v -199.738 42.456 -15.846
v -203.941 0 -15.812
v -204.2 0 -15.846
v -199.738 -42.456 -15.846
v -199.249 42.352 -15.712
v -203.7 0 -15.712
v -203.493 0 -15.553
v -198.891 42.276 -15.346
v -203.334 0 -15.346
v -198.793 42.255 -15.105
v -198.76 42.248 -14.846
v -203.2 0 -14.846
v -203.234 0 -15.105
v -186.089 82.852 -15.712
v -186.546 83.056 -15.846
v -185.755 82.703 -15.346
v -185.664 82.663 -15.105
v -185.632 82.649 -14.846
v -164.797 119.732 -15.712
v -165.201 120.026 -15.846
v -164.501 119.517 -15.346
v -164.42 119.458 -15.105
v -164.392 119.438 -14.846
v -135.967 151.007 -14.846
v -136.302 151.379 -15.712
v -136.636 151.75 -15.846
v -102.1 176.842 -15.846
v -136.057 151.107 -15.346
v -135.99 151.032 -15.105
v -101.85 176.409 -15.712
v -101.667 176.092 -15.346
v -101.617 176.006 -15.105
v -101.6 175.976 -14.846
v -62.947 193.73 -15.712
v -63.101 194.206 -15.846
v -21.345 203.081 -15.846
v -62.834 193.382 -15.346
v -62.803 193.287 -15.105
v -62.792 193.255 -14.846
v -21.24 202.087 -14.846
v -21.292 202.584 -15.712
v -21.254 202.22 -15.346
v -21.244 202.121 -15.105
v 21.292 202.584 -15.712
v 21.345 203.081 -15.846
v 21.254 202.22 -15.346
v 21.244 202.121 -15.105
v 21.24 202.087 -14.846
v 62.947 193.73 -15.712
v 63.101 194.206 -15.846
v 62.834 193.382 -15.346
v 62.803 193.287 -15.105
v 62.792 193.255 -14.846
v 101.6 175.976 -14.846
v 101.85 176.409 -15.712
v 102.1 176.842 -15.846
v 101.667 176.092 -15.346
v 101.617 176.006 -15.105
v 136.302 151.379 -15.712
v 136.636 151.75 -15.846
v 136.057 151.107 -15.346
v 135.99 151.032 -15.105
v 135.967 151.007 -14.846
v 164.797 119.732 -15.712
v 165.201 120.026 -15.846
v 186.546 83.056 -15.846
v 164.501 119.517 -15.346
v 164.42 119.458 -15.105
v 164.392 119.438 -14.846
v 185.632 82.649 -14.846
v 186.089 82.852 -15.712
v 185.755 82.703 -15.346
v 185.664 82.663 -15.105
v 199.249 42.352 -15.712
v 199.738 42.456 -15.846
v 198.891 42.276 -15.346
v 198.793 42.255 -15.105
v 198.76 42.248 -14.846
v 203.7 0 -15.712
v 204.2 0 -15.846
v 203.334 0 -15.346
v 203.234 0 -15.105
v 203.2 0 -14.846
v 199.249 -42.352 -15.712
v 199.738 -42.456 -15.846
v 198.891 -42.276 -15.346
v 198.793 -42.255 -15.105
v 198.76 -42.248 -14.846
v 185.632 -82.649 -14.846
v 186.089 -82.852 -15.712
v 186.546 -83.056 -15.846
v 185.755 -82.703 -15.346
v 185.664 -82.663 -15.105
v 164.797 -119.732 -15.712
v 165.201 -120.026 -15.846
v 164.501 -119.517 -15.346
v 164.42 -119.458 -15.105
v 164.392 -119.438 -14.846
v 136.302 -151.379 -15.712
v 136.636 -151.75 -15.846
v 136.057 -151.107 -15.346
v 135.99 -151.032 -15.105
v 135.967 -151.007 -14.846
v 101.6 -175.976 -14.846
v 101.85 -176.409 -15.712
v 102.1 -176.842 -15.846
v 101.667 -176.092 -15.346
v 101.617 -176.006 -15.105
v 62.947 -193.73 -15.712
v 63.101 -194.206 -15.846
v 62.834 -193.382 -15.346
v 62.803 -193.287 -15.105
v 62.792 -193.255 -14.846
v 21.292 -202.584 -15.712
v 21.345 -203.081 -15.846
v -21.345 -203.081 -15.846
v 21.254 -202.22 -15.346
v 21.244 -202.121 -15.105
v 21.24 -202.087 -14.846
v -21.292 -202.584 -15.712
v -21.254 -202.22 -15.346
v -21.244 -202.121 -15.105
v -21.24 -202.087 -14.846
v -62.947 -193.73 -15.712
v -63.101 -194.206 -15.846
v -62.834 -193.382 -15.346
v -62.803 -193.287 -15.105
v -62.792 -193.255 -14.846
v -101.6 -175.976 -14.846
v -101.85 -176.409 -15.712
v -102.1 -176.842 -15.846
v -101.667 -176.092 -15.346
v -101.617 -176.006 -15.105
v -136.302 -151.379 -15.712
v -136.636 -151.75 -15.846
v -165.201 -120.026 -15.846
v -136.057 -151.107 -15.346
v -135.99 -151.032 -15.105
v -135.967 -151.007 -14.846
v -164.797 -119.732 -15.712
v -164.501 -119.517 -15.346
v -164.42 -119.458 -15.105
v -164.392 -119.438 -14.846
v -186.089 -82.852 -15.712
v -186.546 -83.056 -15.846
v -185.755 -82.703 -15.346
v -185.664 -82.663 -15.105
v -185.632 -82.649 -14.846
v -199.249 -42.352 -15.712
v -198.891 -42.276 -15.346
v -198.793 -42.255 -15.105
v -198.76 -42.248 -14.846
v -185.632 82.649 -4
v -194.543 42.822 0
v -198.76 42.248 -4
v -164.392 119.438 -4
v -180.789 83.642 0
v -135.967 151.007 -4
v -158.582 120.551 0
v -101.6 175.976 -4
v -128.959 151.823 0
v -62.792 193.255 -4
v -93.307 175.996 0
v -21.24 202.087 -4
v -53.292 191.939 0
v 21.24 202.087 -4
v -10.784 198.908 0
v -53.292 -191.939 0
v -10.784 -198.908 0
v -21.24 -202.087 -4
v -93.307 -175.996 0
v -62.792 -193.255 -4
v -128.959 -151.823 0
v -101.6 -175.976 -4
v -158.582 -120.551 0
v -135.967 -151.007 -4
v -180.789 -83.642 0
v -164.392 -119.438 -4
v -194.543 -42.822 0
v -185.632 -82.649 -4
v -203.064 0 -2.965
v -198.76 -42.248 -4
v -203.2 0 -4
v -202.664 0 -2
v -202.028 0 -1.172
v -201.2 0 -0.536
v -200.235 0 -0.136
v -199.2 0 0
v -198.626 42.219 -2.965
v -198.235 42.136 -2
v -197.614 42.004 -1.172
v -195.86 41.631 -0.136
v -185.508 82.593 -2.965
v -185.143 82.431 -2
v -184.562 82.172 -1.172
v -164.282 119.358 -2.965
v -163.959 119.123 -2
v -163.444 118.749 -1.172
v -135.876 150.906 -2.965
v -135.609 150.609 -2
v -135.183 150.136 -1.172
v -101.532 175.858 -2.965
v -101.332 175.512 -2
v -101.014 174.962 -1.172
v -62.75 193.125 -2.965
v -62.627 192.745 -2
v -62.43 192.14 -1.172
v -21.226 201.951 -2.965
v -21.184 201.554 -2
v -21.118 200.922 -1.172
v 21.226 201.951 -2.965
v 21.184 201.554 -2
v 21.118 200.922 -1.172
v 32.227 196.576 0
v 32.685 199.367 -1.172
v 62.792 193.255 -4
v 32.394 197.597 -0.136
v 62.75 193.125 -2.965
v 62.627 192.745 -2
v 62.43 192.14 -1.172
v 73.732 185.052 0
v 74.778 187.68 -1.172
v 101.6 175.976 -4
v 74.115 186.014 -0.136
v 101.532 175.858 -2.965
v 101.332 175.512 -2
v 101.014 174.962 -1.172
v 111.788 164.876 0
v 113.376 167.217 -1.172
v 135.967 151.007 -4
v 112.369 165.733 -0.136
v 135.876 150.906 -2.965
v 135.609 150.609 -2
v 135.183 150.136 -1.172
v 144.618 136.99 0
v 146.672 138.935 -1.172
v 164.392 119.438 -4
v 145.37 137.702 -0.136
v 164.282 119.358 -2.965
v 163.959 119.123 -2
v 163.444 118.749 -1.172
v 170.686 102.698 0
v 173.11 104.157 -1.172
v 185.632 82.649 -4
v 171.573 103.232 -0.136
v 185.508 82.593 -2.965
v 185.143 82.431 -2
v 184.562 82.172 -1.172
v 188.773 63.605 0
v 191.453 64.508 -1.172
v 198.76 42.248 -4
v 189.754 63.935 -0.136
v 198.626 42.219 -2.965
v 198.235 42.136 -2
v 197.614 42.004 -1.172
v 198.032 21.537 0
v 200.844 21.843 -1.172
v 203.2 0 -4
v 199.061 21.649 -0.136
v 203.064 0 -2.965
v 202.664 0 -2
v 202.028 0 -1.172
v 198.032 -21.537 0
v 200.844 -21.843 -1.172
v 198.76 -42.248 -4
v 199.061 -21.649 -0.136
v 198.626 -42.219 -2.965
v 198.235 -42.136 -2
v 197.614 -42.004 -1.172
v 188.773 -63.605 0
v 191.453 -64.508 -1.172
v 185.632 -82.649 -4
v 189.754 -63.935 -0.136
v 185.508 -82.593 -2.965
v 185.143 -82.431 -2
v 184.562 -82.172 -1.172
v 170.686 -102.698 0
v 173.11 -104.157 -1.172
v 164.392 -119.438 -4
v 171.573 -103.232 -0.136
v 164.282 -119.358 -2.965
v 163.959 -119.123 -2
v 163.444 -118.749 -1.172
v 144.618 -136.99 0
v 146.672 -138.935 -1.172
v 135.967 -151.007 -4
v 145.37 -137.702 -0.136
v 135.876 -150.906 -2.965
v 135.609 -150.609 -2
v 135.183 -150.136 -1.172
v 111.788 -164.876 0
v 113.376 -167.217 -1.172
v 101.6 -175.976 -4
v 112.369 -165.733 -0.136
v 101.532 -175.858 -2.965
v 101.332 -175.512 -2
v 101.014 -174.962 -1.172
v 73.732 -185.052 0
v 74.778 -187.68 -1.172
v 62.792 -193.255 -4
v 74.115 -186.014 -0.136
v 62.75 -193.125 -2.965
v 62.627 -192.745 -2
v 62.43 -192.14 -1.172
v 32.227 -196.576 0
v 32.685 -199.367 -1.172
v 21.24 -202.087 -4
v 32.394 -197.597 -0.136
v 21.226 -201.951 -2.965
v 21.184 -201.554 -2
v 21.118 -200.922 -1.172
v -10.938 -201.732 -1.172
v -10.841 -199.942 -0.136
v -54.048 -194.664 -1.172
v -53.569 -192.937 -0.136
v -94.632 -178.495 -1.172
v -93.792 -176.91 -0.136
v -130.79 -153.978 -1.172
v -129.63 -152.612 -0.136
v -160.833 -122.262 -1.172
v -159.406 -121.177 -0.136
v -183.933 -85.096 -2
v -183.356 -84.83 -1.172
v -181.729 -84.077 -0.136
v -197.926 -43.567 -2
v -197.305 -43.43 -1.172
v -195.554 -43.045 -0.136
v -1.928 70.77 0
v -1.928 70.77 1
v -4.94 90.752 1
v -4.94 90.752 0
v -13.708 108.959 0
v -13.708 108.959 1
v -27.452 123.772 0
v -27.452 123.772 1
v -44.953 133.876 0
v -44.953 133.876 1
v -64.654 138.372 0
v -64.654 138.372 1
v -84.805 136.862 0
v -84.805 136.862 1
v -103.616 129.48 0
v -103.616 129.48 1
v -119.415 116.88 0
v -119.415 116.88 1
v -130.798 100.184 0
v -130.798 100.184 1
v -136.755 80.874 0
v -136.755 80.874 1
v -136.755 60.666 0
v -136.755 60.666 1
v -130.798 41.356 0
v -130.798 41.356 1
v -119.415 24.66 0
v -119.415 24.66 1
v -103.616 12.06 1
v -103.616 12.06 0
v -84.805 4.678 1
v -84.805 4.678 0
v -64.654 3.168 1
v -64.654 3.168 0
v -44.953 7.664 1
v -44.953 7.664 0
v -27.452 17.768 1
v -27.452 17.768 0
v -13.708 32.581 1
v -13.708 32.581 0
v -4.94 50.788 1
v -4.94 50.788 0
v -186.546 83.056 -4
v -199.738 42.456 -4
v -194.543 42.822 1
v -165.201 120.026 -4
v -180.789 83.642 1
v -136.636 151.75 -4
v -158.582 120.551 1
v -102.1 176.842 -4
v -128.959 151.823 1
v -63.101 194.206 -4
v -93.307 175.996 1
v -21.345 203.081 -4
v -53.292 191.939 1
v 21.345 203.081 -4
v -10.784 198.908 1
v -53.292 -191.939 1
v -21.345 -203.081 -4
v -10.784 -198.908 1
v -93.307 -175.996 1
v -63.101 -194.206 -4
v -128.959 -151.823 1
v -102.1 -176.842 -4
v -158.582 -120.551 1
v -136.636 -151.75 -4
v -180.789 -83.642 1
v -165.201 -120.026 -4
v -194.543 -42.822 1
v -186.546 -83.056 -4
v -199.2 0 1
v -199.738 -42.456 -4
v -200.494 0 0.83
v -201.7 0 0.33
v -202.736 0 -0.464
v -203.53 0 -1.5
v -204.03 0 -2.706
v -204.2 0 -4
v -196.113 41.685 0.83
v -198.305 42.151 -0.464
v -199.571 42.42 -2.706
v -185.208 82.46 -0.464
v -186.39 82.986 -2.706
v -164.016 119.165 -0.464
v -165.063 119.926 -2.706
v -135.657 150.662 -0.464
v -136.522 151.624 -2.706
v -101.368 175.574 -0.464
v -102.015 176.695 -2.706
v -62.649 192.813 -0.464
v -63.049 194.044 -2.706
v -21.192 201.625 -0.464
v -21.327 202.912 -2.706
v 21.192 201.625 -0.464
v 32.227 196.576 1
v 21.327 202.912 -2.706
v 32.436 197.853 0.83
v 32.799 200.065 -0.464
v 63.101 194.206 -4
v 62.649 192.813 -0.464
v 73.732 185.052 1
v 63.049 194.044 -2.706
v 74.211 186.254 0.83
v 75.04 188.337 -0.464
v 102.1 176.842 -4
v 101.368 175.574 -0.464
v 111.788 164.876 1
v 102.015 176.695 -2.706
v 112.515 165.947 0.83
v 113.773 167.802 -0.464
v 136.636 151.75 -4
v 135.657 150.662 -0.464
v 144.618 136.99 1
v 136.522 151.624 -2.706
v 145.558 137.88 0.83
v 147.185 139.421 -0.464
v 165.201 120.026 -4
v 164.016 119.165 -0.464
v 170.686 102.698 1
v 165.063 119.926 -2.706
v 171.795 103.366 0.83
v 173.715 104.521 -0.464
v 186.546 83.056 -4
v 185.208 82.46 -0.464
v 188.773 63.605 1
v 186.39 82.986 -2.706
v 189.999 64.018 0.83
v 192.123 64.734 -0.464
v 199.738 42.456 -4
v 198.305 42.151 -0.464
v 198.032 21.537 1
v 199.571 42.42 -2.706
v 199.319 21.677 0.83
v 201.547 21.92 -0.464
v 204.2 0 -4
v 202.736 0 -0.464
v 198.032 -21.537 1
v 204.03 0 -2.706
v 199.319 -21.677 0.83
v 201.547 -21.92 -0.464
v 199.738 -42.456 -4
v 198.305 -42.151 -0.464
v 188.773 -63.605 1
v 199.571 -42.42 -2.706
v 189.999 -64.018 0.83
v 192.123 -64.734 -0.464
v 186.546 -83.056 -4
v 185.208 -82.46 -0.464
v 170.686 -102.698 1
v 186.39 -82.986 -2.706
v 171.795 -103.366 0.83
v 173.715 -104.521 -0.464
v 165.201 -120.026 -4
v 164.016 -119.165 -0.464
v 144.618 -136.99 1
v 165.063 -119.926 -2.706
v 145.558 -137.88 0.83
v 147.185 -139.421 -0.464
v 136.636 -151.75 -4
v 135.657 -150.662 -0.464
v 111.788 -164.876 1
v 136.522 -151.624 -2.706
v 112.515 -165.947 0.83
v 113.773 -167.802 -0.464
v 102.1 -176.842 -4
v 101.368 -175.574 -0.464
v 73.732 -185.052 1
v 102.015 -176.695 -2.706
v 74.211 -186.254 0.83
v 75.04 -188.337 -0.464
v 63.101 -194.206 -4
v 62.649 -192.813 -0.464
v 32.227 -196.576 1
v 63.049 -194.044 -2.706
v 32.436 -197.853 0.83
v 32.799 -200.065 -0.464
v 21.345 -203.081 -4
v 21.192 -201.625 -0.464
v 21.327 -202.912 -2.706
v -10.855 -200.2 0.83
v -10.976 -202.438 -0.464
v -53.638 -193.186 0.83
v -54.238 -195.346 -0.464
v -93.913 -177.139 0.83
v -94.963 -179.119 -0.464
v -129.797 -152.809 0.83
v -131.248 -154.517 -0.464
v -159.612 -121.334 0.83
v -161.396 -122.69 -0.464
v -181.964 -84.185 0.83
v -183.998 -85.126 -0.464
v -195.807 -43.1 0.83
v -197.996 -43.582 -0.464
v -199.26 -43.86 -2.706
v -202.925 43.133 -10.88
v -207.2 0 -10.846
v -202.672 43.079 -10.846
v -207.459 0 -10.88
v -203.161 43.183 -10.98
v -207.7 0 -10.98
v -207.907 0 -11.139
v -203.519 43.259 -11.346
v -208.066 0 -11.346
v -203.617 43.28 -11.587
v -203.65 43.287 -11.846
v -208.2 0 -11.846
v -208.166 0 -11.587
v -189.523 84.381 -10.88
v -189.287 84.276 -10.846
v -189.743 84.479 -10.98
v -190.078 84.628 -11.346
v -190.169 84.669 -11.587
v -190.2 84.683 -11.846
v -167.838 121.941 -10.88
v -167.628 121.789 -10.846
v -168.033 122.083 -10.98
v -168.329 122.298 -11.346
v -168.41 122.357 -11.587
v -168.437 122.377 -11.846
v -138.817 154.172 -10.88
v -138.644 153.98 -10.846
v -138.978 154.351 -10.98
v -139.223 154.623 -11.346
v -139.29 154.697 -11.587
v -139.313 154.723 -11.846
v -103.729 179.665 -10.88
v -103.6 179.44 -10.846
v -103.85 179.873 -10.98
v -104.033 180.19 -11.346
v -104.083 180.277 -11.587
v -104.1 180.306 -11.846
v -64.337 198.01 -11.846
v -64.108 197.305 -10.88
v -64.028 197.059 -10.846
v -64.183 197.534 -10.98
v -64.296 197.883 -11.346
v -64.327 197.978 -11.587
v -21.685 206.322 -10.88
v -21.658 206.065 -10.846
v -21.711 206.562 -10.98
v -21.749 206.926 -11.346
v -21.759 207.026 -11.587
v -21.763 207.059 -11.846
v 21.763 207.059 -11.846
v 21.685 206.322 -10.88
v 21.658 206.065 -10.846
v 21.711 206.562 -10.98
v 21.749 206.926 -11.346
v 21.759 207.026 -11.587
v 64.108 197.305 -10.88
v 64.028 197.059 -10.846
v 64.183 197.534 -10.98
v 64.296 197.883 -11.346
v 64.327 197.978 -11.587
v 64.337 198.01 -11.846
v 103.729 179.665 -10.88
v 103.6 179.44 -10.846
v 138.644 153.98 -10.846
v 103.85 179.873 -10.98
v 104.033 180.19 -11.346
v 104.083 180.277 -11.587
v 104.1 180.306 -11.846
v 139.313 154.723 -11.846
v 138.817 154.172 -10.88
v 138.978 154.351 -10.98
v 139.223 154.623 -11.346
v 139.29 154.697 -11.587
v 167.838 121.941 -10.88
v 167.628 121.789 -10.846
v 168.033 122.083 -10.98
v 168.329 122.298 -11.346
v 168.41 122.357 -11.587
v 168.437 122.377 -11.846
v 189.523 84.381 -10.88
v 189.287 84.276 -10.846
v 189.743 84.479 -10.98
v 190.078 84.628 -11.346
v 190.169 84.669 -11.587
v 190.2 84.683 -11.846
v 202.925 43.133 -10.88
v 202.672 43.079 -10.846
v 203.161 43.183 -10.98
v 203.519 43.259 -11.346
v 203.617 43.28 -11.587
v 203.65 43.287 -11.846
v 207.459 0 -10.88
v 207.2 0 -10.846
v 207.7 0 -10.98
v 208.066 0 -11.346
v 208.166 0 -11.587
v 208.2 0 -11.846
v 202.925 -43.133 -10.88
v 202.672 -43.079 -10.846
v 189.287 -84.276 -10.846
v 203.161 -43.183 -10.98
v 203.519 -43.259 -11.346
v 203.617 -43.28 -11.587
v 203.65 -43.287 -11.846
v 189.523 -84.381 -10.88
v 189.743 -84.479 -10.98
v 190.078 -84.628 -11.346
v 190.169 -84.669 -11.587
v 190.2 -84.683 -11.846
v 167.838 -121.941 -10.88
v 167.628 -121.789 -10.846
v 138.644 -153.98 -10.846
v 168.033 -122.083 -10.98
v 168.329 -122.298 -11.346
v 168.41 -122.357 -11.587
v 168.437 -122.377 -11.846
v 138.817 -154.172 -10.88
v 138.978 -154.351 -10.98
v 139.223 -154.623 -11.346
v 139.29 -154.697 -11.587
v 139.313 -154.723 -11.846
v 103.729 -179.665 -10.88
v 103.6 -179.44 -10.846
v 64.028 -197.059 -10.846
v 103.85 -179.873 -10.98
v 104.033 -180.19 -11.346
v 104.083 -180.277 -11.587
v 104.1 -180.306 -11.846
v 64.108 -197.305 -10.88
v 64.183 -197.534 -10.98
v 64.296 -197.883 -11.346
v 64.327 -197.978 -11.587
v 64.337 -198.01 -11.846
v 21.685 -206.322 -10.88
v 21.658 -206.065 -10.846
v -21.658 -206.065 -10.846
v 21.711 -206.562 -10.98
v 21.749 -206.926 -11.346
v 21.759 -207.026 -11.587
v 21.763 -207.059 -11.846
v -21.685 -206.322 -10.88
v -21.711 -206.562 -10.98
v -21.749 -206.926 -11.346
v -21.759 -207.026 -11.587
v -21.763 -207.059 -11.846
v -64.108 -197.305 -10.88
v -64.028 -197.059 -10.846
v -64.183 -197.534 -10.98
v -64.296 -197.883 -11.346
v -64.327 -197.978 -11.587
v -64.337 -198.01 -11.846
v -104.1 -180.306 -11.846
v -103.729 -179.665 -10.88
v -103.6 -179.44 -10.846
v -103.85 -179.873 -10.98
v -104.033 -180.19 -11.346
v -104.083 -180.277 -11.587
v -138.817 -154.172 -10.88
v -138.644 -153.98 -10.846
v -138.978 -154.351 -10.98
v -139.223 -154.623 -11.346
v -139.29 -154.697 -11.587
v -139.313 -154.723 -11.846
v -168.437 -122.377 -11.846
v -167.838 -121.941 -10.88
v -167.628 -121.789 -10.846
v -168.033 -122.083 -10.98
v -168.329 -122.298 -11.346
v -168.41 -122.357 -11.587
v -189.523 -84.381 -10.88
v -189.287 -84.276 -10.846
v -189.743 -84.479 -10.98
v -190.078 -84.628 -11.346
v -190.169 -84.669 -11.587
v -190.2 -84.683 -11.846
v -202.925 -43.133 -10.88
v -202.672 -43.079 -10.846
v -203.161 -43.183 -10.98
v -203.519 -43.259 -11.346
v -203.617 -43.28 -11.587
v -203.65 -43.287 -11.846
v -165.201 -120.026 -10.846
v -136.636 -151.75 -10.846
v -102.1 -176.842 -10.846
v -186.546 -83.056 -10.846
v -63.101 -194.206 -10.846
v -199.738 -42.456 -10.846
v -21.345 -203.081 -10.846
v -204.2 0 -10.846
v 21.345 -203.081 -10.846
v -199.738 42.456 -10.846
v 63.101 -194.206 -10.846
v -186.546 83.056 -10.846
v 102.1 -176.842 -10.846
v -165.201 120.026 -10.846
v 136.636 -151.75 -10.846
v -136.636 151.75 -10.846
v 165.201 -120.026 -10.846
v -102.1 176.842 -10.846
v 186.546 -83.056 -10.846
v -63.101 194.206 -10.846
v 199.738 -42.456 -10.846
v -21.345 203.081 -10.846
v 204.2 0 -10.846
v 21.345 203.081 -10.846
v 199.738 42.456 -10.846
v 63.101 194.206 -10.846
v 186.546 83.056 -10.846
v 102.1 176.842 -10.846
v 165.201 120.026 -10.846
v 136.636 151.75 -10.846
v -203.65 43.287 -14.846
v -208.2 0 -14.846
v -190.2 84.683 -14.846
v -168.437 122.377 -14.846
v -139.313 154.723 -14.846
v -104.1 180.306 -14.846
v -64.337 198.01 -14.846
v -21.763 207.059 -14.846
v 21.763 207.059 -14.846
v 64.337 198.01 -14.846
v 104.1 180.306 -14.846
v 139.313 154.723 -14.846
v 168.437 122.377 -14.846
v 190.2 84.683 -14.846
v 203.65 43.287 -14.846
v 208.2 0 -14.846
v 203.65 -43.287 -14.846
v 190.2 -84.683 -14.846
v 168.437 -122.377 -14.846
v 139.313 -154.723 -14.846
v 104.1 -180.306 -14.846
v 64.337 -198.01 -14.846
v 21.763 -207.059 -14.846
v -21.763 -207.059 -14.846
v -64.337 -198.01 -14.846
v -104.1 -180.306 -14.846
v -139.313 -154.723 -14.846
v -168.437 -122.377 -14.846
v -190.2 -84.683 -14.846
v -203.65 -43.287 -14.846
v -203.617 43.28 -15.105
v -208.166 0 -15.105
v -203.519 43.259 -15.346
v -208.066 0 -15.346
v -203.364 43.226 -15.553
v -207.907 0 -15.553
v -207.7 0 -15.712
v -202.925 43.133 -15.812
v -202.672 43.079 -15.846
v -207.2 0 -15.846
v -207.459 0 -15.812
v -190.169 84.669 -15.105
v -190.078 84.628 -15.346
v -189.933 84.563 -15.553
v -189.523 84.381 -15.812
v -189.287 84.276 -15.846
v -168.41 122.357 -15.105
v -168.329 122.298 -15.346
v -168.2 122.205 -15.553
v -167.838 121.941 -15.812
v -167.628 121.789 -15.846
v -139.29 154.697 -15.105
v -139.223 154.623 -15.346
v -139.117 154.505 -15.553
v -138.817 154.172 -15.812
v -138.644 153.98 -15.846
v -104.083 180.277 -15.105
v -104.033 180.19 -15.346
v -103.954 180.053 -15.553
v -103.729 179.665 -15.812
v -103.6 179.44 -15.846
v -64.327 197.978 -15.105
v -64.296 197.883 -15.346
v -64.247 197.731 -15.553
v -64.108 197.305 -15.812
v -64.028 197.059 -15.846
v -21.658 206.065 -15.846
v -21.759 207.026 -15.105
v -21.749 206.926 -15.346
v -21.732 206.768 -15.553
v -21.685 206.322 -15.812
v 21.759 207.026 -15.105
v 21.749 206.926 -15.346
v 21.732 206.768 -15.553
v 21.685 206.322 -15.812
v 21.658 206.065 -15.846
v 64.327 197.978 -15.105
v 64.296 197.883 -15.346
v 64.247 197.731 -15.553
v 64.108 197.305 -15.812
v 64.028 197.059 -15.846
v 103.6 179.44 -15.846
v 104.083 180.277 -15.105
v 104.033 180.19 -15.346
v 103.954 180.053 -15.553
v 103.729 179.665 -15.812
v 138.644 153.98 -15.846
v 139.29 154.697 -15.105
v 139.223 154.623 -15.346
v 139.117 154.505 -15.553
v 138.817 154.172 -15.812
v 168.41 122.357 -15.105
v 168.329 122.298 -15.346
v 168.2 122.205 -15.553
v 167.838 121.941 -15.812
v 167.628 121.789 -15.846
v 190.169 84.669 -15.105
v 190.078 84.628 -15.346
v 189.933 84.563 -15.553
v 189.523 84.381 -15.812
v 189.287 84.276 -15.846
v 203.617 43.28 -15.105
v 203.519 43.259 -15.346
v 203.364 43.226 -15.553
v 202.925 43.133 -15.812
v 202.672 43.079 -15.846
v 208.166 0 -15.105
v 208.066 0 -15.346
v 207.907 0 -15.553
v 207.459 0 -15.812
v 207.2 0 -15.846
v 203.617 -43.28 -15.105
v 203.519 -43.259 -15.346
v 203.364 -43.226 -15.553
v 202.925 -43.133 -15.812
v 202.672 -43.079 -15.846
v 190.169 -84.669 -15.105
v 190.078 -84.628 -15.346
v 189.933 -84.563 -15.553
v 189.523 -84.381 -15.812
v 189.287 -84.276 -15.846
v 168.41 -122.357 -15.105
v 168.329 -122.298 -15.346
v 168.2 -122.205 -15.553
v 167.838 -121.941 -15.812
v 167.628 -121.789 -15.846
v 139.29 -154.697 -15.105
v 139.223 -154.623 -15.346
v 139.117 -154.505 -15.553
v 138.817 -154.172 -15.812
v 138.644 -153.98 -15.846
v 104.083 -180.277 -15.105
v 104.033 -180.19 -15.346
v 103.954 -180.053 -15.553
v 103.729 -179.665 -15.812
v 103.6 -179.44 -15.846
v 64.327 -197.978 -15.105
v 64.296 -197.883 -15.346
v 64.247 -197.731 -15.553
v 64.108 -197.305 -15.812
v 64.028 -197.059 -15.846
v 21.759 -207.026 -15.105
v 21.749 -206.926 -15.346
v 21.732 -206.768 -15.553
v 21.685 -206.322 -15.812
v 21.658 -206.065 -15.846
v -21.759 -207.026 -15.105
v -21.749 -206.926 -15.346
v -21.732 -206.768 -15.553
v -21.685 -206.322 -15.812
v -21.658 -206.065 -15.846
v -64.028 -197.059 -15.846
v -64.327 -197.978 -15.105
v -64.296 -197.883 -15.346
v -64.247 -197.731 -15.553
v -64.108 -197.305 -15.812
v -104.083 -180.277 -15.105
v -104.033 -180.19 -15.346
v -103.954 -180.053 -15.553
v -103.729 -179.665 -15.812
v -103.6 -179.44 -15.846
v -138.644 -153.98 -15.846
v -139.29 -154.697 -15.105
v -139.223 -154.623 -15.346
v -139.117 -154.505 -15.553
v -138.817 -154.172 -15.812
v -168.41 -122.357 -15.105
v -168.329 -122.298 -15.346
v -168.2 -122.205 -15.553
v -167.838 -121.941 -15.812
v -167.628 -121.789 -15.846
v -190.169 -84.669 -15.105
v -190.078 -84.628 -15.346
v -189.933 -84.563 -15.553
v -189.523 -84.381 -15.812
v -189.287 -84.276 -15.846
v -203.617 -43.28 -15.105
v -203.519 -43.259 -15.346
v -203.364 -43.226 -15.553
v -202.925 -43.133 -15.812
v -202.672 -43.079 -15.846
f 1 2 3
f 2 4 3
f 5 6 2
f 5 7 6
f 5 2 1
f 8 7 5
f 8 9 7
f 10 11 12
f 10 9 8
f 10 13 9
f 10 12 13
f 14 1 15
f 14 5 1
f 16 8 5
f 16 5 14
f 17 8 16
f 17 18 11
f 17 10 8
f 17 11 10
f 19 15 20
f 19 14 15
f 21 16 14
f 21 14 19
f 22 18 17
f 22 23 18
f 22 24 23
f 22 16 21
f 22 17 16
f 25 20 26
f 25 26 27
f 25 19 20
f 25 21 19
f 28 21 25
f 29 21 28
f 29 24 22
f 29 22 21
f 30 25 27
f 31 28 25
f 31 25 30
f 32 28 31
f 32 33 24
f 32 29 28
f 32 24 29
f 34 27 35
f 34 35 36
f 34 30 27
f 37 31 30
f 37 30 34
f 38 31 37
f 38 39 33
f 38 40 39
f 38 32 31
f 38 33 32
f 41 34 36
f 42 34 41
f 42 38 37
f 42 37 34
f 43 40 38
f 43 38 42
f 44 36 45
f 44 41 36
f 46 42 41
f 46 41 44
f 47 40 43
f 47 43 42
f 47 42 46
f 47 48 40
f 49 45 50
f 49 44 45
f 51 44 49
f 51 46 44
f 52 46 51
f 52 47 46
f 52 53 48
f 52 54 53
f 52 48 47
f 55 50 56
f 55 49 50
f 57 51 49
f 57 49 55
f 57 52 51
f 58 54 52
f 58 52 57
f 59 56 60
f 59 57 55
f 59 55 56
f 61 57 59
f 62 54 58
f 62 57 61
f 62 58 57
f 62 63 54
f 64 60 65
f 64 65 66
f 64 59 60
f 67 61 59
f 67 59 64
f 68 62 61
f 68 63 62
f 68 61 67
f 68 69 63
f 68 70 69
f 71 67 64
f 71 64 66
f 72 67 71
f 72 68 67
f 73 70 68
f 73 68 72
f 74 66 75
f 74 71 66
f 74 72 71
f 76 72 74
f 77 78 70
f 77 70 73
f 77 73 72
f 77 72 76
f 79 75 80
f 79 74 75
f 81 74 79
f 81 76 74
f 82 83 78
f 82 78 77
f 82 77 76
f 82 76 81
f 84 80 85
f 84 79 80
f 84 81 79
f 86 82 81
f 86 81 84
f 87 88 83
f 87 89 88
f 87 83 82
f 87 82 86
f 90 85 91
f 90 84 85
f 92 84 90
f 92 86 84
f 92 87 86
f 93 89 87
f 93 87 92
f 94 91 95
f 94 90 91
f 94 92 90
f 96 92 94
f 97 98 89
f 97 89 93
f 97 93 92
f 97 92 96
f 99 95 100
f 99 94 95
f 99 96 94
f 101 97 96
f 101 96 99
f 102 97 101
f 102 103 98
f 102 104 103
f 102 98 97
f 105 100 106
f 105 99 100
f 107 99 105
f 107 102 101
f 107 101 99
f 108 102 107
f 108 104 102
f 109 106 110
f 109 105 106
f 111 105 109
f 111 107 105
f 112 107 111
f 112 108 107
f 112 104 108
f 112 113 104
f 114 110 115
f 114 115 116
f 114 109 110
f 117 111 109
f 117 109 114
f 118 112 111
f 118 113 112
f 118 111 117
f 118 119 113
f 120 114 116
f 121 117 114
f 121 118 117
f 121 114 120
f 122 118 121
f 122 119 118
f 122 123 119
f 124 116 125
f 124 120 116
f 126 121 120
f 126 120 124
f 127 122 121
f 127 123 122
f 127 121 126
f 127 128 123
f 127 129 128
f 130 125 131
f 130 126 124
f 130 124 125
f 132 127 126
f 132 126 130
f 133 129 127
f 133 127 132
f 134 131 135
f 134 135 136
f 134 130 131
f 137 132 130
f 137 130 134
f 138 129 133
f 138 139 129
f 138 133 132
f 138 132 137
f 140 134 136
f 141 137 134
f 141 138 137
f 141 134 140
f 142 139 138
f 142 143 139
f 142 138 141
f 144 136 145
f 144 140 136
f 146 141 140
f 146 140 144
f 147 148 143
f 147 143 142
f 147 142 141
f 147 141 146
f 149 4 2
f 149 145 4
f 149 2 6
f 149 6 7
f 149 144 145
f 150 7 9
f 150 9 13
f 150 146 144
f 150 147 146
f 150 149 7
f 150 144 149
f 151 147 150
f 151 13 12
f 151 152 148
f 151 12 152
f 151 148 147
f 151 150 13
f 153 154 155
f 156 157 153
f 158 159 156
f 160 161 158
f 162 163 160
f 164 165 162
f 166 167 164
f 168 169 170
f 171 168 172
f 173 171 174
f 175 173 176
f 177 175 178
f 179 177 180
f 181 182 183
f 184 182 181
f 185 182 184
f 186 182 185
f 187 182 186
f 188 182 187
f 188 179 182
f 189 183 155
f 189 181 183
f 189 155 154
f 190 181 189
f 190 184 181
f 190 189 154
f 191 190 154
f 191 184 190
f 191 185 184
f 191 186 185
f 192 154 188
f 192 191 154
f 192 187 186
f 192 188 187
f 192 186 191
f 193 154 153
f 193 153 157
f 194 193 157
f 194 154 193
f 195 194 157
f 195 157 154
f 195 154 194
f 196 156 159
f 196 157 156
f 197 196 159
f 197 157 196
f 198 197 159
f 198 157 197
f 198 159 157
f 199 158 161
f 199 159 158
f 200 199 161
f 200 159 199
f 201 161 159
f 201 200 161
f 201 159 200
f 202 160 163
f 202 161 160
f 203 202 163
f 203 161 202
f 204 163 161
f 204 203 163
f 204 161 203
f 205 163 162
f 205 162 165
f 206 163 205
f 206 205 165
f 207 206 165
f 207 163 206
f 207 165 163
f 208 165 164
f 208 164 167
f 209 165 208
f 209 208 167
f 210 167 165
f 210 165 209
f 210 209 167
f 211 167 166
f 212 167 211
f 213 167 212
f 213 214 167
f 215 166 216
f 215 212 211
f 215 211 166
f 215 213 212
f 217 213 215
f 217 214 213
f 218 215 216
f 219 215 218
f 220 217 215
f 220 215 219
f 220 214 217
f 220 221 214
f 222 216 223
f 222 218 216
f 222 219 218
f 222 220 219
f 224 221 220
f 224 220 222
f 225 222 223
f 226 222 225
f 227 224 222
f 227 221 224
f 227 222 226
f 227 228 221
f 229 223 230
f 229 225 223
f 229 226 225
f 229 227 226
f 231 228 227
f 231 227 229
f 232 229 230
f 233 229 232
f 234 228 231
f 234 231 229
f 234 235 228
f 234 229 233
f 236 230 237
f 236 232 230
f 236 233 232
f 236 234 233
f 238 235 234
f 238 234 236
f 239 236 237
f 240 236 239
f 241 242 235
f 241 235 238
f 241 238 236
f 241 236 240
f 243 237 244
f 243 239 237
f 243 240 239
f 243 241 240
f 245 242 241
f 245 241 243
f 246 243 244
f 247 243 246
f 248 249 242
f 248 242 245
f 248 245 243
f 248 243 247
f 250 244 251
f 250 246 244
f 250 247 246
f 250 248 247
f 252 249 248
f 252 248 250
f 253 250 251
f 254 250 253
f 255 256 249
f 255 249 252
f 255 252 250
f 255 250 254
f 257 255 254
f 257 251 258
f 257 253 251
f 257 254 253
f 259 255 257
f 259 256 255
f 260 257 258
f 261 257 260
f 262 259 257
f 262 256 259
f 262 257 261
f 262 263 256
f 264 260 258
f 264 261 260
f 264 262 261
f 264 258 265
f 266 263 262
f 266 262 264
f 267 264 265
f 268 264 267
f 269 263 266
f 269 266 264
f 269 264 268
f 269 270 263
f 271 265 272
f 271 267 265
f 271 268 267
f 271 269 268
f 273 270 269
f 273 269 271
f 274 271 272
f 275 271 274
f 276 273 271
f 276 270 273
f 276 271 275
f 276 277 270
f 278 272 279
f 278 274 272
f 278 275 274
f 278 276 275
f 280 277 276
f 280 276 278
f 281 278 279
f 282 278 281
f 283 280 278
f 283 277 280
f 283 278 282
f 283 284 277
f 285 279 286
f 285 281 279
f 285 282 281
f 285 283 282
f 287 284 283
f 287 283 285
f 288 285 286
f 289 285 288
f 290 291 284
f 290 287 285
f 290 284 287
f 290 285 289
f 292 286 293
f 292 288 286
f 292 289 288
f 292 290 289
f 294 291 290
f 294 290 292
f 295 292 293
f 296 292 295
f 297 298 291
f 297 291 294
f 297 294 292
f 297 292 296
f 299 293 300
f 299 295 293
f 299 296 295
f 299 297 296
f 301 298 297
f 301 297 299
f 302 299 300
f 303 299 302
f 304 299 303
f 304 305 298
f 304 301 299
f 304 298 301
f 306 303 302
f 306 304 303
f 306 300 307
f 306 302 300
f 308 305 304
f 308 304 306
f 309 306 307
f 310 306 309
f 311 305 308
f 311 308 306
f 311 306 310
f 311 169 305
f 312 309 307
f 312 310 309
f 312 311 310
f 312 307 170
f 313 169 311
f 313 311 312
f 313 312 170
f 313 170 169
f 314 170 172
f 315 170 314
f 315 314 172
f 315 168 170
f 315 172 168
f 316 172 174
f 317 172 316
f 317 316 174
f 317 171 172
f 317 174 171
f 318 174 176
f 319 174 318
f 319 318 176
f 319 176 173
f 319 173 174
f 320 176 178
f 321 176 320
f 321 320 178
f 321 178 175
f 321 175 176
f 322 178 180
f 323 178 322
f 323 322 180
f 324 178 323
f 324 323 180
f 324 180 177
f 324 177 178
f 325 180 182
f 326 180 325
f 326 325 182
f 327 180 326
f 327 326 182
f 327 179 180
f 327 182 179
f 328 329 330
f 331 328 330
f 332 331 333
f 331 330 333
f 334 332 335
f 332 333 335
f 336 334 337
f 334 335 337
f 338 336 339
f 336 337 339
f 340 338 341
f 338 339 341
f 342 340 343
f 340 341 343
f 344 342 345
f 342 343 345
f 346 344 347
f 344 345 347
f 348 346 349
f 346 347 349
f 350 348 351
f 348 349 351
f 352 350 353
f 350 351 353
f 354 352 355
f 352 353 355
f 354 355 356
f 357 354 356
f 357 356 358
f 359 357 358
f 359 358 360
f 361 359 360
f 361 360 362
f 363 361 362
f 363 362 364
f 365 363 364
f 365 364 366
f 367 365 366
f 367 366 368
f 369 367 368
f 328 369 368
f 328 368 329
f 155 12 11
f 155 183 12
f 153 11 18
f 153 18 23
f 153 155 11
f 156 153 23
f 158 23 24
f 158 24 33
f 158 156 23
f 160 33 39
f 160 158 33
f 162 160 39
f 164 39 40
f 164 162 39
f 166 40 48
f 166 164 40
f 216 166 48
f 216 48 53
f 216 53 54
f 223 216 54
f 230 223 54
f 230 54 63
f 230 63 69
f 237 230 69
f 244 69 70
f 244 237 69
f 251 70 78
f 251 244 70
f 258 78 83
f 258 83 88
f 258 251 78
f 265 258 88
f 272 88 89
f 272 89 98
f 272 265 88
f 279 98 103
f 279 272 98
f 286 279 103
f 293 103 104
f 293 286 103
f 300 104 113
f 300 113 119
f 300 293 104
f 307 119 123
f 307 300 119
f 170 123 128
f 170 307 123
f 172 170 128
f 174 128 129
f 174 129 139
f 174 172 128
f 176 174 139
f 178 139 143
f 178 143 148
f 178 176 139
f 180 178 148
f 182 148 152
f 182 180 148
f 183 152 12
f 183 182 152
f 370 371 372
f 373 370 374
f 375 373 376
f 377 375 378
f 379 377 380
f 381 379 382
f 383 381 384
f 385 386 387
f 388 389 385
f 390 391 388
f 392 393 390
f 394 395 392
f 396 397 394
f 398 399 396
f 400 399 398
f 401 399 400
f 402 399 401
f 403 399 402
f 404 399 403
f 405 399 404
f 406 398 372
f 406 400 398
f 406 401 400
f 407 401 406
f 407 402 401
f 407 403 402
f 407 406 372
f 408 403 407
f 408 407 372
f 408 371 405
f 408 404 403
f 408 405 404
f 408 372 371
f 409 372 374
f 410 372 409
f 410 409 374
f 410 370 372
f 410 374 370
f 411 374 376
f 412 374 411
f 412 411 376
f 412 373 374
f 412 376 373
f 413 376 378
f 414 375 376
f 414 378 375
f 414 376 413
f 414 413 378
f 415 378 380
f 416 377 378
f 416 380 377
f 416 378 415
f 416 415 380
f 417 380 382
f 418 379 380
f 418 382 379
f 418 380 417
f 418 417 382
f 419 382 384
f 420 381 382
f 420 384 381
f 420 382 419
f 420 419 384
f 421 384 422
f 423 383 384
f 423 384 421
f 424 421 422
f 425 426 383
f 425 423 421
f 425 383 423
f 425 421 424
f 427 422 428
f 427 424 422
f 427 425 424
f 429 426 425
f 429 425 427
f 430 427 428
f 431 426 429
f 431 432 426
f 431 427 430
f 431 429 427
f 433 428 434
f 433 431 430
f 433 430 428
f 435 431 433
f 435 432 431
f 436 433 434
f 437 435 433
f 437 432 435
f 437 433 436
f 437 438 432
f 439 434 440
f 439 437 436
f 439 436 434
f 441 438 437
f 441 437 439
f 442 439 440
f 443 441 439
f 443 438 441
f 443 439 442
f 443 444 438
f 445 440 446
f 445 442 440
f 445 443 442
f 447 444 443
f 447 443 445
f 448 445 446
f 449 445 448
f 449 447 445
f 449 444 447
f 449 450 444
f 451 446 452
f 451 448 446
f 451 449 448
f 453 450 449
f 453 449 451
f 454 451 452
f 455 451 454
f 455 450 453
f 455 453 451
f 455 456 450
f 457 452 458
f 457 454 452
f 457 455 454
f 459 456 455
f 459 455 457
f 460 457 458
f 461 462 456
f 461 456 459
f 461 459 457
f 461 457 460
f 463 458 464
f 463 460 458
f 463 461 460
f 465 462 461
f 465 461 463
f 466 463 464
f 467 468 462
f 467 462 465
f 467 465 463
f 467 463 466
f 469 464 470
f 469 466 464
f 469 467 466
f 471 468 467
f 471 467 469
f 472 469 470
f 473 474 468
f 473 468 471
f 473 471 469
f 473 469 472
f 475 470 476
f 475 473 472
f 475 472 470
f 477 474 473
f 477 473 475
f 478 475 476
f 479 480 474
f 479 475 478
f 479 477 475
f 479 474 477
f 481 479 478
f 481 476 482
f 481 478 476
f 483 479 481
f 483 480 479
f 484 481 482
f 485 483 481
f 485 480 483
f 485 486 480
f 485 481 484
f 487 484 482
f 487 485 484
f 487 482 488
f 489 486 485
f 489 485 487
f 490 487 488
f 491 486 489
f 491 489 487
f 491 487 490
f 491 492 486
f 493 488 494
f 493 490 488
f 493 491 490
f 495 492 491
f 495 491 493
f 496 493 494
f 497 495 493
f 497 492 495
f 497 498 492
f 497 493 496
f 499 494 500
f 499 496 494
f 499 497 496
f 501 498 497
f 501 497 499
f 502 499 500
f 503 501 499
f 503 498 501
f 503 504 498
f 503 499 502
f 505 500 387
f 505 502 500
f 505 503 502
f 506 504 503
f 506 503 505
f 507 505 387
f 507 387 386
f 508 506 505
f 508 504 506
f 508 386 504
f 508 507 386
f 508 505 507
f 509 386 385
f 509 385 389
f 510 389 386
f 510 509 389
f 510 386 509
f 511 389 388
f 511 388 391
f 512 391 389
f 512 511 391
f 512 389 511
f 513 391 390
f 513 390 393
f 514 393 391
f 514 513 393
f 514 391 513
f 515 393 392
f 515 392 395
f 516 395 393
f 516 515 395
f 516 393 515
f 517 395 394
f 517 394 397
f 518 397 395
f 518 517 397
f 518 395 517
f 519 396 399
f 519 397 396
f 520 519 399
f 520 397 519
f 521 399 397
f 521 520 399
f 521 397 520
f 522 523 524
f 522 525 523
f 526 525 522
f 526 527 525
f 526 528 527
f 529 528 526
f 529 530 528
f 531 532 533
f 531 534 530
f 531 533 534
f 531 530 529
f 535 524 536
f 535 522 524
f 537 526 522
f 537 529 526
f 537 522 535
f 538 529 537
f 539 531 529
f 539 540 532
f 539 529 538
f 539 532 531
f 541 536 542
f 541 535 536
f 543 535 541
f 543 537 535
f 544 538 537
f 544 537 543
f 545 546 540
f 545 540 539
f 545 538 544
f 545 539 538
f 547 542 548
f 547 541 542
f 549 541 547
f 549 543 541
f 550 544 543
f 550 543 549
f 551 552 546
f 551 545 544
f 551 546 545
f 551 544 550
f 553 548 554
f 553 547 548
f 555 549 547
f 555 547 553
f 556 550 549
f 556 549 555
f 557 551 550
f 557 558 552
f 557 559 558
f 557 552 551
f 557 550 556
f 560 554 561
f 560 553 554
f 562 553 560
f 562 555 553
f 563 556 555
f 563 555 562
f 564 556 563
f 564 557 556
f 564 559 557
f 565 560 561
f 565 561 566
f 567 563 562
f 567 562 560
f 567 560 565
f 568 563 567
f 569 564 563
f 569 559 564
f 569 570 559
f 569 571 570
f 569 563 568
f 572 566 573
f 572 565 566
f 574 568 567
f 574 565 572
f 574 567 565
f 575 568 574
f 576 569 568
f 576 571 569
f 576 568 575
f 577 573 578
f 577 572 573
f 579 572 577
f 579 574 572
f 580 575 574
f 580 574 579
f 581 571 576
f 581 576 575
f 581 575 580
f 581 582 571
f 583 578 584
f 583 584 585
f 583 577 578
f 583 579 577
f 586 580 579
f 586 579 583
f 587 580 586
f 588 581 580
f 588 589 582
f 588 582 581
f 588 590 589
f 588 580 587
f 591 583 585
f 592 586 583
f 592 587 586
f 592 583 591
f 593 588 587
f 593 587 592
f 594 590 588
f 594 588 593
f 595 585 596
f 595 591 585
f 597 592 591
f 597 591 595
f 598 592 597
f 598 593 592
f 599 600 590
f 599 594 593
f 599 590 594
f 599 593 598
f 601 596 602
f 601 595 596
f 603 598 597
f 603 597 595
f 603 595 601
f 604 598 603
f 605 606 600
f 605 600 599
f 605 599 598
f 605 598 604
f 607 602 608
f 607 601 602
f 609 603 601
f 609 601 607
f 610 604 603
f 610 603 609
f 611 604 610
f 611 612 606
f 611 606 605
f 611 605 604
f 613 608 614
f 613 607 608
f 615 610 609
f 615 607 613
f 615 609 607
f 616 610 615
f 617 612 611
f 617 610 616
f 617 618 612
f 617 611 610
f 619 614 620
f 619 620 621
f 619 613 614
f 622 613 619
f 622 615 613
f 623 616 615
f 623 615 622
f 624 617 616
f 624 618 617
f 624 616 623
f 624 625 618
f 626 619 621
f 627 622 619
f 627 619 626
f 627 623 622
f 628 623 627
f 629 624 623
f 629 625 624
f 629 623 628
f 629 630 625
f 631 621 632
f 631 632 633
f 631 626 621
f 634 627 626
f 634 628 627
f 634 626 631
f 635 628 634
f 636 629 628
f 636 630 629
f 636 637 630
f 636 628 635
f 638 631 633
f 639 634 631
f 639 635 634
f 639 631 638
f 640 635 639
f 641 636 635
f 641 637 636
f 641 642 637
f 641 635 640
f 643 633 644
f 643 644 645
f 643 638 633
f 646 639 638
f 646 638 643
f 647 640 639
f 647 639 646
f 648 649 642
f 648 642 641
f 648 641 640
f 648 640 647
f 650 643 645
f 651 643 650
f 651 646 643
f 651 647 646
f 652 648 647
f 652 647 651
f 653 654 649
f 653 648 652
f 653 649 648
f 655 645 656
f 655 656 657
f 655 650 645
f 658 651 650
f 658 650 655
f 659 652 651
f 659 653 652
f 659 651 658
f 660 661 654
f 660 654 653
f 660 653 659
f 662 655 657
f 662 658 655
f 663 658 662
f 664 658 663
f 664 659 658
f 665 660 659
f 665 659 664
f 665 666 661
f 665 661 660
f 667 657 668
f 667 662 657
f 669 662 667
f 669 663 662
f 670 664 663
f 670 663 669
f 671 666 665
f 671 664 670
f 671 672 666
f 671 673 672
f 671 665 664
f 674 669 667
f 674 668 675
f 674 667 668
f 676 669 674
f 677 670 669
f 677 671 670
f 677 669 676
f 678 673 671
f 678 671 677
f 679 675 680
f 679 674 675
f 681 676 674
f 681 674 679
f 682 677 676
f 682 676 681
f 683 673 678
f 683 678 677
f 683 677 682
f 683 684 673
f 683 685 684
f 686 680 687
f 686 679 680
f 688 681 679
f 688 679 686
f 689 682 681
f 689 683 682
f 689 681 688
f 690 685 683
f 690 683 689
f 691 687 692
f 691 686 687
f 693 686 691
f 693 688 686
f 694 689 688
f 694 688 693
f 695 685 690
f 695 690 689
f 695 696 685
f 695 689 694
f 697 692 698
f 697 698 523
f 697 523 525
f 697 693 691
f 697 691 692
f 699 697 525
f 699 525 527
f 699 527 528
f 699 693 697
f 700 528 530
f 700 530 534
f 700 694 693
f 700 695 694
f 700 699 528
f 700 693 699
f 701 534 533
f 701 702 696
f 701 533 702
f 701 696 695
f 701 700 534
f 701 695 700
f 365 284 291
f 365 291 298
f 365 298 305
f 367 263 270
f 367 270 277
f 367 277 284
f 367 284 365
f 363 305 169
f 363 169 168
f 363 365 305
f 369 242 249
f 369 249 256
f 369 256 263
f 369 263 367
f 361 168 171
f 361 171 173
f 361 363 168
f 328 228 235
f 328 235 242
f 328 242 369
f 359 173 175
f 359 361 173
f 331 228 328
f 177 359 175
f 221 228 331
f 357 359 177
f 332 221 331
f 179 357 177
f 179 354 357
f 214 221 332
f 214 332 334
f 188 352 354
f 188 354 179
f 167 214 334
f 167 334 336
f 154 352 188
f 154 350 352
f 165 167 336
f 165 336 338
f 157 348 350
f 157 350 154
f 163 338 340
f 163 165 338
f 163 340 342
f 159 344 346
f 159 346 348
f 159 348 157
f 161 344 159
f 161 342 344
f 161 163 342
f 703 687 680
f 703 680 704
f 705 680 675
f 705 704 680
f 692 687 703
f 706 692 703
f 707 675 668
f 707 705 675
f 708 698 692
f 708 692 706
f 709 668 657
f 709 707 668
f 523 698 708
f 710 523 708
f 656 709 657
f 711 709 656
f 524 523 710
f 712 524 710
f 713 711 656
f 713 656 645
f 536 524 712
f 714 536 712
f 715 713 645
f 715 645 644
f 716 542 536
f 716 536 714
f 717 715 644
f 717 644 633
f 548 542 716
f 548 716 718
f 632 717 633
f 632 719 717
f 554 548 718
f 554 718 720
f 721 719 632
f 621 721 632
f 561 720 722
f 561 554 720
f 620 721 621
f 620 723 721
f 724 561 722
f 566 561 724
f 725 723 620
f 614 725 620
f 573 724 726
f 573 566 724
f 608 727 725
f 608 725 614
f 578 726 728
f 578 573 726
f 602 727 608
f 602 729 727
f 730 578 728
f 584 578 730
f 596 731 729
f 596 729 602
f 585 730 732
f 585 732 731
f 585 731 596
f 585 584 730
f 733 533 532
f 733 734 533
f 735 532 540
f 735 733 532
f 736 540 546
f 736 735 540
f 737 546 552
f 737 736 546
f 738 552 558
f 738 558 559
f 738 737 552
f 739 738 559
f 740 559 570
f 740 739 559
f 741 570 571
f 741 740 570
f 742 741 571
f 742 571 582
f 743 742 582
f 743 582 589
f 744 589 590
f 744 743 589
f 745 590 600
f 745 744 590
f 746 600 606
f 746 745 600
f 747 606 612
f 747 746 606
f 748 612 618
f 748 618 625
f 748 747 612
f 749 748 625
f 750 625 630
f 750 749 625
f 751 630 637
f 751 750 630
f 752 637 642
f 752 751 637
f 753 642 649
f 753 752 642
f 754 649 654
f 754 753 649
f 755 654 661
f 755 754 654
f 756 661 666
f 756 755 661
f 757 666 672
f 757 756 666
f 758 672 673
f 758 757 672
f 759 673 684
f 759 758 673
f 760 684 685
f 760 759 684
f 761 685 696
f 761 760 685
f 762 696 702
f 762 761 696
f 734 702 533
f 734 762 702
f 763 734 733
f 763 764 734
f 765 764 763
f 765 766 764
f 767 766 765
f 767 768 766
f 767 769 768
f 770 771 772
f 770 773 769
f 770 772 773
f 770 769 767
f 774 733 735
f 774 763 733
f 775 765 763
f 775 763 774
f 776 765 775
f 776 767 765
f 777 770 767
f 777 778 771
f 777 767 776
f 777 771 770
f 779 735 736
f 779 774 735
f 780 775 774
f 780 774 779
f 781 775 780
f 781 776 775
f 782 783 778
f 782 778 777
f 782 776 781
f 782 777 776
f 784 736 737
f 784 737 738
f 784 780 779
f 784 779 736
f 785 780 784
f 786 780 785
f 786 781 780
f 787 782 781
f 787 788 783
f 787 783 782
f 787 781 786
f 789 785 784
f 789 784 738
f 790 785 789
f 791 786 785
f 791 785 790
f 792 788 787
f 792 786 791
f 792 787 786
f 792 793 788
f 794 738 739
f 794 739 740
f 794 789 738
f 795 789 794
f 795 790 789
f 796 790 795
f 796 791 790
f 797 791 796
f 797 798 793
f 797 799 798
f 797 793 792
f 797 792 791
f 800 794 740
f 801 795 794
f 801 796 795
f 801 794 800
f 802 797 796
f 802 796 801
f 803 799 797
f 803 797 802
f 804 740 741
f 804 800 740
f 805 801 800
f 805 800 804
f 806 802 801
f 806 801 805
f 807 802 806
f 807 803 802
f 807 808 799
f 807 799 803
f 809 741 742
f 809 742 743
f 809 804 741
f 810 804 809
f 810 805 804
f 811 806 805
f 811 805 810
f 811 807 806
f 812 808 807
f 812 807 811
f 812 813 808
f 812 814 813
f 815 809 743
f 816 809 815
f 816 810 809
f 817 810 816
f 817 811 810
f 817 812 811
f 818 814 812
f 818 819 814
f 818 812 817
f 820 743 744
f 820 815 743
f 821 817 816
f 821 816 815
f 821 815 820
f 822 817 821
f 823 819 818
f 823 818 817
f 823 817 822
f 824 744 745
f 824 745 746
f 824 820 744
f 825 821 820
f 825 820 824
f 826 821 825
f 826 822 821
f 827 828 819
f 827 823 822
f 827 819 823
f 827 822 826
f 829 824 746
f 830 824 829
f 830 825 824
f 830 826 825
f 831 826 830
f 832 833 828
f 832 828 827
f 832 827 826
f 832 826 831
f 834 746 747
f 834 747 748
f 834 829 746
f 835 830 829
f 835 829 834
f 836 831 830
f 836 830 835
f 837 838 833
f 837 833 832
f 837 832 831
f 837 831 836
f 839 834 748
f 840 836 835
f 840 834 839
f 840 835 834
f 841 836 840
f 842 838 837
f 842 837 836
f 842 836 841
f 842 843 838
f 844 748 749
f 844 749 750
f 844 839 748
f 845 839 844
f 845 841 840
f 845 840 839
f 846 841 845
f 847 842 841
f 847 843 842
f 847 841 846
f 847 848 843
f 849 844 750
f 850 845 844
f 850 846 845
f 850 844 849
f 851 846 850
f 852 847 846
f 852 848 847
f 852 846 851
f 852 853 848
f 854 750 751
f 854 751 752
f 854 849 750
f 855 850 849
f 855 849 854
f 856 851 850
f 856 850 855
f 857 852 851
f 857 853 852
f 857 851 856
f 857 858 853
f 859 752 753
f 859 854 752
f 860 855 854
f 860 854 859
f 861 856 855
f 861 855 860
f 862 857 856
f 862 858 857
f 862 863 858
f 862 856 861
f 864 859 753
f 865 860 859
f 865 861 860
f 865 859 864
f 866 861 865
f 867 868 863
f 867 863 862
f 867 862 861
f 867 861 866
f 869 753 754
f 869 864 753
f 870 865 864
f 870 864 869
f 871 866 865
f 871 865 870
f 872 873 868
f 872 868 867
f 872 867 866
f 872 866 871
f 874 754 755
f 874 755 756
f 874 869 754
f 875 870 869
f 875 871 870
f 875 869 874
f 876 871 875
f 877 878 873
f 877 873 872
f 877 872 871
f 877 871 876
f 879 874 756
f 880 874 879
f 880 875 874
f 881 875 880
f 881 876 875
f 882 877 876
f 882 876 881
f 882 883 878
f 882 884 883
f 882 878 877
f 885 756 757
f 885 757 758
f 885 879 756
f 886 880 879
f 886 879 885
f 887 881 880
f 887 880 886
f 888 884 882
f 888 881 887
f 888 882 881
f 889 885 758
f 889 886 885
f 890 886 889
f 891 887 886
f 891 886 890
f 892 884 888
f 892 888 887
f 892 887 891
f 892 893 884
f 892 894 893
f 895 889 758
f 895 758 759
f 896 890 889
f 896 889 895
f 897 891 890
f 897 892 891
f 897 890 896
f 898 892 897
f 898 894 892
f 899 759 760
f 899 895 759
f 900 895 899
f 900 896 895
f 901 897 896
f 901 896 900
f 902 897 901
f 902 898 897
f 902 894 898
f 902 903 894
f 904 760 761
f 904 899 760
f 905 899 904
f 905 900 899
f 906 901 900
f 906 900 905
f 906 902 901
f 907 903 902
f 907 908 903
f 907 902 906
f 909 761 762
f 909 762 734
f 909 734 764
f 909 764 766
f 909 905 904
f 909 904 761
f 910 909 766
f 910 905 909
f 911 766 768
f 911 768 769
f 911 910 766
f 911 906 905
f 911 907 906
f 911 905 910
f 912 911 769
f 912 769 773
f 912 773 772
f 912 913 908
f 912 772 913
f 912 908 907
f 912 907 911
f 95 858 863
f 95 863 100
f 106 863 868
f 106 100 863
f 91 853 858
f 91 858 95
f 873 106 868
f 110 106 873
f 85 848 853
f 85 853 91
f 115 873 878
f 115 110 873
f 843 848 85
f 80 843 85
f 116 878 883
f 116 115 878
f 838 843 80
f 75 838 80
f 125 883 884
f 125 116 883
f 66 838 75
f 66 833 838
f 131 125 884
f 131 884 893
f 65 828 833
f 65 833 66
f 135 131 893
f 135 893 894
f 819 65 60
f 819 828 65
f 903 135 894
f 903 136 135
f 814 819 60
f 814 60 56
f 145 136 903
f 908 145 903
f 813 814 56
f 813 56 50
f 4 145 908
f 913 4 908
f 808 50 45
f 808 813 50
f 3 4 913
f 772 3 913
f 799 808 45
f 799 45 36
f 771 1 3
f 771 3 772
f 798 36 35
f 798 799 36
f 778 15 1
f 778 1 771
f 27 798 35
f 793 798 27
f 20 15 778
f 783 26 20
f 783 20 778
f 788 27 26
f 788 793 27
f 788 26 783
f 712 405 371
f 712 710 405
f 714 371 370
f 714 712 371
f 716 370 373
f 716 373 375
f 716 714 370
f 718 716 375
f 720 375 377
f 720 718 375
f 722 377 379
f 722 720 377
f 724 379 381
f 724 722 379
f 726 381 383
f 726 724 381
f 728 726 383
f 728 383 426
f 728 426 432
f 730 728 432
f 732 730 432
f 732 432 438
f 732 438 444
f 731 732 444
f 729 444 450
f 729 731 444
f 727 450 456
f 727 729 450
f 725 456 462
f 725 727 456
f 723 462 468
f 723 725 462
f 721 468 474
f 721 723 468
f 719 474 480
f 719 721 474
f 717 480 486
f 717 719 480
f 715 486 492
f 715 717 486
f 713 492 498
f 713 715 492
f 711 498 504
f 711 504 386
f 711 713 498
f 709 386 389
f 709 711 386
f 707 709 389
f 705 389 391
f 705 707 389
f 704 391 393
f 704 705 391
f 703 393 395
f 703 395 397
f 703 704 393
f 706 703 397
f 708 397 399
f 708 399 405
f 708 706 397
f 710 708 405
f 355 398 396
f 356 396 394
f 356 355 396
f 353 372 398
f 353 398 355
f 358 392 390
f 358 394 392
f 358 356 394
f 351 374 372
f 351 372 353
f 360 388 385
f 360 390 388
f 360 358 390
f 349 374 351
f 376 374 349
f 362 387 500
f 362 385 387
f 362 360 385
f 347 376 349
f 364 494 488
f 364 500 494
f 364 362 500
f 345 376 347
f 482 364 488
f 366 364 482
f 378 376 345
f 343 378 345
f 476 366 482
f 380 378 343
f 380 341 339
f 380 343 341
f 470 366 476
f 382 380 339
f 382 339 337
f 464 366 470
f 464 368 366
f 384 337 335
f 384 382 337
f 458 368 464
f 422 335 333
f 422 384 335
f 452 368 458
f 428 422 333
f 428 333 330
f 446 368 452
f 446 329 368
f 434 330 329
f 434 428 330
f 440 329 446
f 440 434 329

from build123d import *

# Parameters (mm, degrees)
F2_R     = 67.791945
F3_DEPTH = 16.846949


with BuildPart() as f1:
    # F0 (on Front) → F1 (revolve)
    with BuildSketch(Plane.XZ):
        with BuildLine():
            Line((-199.2, 0), (0, 0))
            Line((0, 0), (0, 1))
            Line((0, 1), (-199.2, 1))
            ThreePointArc((-199.2, 1), (-202.735534, -0.464466), (-204.2, -4))
            Line((-204.2, -4), (-204.2, -10.845949))
            Line((-204.2, -10.845949), (-207.2, -10.845949))
            ThreePointArc((-207.2, -10.845949), (-207.907107, -11.138842), (-208.2, -11.845949))
            Line((-208.2, -11.845949), (-208.2, -14.845949))
            ThreePointArc((-208.2, -14.845949), (-207.907107, -15.553056), (-207.2, -15.845949))
            Line((-207.2, -15.845949), (-204.2, -15.845949))
            ThreePointArc((-204.2, -15.845949), (-203.492893, -15.553056), (-203.2, -14.845949))
            Line((-203.2, -14.845949), (-203.2, -10.845949))
            Line((-203.2, -10.845949), (-203.2, -4))
            ThreePointArc((-203.2, -4), (-202.028427, -1.171573), (-199.2, 0))
        make_face()
    revolve(axis=Axis((0, 0, 0.5), (0, 0, -1)))

    # F2 (on face) → F3 (cut, through all)
    with BuildSketch(Plane.XY.offset(1)):
        with Locations((-69.72, 70.769995)):
            Circle(F2_R)
    extrude(amount=-F3_DEPTH, mode=Mode.SUBTRACT)


solid = f1.part
